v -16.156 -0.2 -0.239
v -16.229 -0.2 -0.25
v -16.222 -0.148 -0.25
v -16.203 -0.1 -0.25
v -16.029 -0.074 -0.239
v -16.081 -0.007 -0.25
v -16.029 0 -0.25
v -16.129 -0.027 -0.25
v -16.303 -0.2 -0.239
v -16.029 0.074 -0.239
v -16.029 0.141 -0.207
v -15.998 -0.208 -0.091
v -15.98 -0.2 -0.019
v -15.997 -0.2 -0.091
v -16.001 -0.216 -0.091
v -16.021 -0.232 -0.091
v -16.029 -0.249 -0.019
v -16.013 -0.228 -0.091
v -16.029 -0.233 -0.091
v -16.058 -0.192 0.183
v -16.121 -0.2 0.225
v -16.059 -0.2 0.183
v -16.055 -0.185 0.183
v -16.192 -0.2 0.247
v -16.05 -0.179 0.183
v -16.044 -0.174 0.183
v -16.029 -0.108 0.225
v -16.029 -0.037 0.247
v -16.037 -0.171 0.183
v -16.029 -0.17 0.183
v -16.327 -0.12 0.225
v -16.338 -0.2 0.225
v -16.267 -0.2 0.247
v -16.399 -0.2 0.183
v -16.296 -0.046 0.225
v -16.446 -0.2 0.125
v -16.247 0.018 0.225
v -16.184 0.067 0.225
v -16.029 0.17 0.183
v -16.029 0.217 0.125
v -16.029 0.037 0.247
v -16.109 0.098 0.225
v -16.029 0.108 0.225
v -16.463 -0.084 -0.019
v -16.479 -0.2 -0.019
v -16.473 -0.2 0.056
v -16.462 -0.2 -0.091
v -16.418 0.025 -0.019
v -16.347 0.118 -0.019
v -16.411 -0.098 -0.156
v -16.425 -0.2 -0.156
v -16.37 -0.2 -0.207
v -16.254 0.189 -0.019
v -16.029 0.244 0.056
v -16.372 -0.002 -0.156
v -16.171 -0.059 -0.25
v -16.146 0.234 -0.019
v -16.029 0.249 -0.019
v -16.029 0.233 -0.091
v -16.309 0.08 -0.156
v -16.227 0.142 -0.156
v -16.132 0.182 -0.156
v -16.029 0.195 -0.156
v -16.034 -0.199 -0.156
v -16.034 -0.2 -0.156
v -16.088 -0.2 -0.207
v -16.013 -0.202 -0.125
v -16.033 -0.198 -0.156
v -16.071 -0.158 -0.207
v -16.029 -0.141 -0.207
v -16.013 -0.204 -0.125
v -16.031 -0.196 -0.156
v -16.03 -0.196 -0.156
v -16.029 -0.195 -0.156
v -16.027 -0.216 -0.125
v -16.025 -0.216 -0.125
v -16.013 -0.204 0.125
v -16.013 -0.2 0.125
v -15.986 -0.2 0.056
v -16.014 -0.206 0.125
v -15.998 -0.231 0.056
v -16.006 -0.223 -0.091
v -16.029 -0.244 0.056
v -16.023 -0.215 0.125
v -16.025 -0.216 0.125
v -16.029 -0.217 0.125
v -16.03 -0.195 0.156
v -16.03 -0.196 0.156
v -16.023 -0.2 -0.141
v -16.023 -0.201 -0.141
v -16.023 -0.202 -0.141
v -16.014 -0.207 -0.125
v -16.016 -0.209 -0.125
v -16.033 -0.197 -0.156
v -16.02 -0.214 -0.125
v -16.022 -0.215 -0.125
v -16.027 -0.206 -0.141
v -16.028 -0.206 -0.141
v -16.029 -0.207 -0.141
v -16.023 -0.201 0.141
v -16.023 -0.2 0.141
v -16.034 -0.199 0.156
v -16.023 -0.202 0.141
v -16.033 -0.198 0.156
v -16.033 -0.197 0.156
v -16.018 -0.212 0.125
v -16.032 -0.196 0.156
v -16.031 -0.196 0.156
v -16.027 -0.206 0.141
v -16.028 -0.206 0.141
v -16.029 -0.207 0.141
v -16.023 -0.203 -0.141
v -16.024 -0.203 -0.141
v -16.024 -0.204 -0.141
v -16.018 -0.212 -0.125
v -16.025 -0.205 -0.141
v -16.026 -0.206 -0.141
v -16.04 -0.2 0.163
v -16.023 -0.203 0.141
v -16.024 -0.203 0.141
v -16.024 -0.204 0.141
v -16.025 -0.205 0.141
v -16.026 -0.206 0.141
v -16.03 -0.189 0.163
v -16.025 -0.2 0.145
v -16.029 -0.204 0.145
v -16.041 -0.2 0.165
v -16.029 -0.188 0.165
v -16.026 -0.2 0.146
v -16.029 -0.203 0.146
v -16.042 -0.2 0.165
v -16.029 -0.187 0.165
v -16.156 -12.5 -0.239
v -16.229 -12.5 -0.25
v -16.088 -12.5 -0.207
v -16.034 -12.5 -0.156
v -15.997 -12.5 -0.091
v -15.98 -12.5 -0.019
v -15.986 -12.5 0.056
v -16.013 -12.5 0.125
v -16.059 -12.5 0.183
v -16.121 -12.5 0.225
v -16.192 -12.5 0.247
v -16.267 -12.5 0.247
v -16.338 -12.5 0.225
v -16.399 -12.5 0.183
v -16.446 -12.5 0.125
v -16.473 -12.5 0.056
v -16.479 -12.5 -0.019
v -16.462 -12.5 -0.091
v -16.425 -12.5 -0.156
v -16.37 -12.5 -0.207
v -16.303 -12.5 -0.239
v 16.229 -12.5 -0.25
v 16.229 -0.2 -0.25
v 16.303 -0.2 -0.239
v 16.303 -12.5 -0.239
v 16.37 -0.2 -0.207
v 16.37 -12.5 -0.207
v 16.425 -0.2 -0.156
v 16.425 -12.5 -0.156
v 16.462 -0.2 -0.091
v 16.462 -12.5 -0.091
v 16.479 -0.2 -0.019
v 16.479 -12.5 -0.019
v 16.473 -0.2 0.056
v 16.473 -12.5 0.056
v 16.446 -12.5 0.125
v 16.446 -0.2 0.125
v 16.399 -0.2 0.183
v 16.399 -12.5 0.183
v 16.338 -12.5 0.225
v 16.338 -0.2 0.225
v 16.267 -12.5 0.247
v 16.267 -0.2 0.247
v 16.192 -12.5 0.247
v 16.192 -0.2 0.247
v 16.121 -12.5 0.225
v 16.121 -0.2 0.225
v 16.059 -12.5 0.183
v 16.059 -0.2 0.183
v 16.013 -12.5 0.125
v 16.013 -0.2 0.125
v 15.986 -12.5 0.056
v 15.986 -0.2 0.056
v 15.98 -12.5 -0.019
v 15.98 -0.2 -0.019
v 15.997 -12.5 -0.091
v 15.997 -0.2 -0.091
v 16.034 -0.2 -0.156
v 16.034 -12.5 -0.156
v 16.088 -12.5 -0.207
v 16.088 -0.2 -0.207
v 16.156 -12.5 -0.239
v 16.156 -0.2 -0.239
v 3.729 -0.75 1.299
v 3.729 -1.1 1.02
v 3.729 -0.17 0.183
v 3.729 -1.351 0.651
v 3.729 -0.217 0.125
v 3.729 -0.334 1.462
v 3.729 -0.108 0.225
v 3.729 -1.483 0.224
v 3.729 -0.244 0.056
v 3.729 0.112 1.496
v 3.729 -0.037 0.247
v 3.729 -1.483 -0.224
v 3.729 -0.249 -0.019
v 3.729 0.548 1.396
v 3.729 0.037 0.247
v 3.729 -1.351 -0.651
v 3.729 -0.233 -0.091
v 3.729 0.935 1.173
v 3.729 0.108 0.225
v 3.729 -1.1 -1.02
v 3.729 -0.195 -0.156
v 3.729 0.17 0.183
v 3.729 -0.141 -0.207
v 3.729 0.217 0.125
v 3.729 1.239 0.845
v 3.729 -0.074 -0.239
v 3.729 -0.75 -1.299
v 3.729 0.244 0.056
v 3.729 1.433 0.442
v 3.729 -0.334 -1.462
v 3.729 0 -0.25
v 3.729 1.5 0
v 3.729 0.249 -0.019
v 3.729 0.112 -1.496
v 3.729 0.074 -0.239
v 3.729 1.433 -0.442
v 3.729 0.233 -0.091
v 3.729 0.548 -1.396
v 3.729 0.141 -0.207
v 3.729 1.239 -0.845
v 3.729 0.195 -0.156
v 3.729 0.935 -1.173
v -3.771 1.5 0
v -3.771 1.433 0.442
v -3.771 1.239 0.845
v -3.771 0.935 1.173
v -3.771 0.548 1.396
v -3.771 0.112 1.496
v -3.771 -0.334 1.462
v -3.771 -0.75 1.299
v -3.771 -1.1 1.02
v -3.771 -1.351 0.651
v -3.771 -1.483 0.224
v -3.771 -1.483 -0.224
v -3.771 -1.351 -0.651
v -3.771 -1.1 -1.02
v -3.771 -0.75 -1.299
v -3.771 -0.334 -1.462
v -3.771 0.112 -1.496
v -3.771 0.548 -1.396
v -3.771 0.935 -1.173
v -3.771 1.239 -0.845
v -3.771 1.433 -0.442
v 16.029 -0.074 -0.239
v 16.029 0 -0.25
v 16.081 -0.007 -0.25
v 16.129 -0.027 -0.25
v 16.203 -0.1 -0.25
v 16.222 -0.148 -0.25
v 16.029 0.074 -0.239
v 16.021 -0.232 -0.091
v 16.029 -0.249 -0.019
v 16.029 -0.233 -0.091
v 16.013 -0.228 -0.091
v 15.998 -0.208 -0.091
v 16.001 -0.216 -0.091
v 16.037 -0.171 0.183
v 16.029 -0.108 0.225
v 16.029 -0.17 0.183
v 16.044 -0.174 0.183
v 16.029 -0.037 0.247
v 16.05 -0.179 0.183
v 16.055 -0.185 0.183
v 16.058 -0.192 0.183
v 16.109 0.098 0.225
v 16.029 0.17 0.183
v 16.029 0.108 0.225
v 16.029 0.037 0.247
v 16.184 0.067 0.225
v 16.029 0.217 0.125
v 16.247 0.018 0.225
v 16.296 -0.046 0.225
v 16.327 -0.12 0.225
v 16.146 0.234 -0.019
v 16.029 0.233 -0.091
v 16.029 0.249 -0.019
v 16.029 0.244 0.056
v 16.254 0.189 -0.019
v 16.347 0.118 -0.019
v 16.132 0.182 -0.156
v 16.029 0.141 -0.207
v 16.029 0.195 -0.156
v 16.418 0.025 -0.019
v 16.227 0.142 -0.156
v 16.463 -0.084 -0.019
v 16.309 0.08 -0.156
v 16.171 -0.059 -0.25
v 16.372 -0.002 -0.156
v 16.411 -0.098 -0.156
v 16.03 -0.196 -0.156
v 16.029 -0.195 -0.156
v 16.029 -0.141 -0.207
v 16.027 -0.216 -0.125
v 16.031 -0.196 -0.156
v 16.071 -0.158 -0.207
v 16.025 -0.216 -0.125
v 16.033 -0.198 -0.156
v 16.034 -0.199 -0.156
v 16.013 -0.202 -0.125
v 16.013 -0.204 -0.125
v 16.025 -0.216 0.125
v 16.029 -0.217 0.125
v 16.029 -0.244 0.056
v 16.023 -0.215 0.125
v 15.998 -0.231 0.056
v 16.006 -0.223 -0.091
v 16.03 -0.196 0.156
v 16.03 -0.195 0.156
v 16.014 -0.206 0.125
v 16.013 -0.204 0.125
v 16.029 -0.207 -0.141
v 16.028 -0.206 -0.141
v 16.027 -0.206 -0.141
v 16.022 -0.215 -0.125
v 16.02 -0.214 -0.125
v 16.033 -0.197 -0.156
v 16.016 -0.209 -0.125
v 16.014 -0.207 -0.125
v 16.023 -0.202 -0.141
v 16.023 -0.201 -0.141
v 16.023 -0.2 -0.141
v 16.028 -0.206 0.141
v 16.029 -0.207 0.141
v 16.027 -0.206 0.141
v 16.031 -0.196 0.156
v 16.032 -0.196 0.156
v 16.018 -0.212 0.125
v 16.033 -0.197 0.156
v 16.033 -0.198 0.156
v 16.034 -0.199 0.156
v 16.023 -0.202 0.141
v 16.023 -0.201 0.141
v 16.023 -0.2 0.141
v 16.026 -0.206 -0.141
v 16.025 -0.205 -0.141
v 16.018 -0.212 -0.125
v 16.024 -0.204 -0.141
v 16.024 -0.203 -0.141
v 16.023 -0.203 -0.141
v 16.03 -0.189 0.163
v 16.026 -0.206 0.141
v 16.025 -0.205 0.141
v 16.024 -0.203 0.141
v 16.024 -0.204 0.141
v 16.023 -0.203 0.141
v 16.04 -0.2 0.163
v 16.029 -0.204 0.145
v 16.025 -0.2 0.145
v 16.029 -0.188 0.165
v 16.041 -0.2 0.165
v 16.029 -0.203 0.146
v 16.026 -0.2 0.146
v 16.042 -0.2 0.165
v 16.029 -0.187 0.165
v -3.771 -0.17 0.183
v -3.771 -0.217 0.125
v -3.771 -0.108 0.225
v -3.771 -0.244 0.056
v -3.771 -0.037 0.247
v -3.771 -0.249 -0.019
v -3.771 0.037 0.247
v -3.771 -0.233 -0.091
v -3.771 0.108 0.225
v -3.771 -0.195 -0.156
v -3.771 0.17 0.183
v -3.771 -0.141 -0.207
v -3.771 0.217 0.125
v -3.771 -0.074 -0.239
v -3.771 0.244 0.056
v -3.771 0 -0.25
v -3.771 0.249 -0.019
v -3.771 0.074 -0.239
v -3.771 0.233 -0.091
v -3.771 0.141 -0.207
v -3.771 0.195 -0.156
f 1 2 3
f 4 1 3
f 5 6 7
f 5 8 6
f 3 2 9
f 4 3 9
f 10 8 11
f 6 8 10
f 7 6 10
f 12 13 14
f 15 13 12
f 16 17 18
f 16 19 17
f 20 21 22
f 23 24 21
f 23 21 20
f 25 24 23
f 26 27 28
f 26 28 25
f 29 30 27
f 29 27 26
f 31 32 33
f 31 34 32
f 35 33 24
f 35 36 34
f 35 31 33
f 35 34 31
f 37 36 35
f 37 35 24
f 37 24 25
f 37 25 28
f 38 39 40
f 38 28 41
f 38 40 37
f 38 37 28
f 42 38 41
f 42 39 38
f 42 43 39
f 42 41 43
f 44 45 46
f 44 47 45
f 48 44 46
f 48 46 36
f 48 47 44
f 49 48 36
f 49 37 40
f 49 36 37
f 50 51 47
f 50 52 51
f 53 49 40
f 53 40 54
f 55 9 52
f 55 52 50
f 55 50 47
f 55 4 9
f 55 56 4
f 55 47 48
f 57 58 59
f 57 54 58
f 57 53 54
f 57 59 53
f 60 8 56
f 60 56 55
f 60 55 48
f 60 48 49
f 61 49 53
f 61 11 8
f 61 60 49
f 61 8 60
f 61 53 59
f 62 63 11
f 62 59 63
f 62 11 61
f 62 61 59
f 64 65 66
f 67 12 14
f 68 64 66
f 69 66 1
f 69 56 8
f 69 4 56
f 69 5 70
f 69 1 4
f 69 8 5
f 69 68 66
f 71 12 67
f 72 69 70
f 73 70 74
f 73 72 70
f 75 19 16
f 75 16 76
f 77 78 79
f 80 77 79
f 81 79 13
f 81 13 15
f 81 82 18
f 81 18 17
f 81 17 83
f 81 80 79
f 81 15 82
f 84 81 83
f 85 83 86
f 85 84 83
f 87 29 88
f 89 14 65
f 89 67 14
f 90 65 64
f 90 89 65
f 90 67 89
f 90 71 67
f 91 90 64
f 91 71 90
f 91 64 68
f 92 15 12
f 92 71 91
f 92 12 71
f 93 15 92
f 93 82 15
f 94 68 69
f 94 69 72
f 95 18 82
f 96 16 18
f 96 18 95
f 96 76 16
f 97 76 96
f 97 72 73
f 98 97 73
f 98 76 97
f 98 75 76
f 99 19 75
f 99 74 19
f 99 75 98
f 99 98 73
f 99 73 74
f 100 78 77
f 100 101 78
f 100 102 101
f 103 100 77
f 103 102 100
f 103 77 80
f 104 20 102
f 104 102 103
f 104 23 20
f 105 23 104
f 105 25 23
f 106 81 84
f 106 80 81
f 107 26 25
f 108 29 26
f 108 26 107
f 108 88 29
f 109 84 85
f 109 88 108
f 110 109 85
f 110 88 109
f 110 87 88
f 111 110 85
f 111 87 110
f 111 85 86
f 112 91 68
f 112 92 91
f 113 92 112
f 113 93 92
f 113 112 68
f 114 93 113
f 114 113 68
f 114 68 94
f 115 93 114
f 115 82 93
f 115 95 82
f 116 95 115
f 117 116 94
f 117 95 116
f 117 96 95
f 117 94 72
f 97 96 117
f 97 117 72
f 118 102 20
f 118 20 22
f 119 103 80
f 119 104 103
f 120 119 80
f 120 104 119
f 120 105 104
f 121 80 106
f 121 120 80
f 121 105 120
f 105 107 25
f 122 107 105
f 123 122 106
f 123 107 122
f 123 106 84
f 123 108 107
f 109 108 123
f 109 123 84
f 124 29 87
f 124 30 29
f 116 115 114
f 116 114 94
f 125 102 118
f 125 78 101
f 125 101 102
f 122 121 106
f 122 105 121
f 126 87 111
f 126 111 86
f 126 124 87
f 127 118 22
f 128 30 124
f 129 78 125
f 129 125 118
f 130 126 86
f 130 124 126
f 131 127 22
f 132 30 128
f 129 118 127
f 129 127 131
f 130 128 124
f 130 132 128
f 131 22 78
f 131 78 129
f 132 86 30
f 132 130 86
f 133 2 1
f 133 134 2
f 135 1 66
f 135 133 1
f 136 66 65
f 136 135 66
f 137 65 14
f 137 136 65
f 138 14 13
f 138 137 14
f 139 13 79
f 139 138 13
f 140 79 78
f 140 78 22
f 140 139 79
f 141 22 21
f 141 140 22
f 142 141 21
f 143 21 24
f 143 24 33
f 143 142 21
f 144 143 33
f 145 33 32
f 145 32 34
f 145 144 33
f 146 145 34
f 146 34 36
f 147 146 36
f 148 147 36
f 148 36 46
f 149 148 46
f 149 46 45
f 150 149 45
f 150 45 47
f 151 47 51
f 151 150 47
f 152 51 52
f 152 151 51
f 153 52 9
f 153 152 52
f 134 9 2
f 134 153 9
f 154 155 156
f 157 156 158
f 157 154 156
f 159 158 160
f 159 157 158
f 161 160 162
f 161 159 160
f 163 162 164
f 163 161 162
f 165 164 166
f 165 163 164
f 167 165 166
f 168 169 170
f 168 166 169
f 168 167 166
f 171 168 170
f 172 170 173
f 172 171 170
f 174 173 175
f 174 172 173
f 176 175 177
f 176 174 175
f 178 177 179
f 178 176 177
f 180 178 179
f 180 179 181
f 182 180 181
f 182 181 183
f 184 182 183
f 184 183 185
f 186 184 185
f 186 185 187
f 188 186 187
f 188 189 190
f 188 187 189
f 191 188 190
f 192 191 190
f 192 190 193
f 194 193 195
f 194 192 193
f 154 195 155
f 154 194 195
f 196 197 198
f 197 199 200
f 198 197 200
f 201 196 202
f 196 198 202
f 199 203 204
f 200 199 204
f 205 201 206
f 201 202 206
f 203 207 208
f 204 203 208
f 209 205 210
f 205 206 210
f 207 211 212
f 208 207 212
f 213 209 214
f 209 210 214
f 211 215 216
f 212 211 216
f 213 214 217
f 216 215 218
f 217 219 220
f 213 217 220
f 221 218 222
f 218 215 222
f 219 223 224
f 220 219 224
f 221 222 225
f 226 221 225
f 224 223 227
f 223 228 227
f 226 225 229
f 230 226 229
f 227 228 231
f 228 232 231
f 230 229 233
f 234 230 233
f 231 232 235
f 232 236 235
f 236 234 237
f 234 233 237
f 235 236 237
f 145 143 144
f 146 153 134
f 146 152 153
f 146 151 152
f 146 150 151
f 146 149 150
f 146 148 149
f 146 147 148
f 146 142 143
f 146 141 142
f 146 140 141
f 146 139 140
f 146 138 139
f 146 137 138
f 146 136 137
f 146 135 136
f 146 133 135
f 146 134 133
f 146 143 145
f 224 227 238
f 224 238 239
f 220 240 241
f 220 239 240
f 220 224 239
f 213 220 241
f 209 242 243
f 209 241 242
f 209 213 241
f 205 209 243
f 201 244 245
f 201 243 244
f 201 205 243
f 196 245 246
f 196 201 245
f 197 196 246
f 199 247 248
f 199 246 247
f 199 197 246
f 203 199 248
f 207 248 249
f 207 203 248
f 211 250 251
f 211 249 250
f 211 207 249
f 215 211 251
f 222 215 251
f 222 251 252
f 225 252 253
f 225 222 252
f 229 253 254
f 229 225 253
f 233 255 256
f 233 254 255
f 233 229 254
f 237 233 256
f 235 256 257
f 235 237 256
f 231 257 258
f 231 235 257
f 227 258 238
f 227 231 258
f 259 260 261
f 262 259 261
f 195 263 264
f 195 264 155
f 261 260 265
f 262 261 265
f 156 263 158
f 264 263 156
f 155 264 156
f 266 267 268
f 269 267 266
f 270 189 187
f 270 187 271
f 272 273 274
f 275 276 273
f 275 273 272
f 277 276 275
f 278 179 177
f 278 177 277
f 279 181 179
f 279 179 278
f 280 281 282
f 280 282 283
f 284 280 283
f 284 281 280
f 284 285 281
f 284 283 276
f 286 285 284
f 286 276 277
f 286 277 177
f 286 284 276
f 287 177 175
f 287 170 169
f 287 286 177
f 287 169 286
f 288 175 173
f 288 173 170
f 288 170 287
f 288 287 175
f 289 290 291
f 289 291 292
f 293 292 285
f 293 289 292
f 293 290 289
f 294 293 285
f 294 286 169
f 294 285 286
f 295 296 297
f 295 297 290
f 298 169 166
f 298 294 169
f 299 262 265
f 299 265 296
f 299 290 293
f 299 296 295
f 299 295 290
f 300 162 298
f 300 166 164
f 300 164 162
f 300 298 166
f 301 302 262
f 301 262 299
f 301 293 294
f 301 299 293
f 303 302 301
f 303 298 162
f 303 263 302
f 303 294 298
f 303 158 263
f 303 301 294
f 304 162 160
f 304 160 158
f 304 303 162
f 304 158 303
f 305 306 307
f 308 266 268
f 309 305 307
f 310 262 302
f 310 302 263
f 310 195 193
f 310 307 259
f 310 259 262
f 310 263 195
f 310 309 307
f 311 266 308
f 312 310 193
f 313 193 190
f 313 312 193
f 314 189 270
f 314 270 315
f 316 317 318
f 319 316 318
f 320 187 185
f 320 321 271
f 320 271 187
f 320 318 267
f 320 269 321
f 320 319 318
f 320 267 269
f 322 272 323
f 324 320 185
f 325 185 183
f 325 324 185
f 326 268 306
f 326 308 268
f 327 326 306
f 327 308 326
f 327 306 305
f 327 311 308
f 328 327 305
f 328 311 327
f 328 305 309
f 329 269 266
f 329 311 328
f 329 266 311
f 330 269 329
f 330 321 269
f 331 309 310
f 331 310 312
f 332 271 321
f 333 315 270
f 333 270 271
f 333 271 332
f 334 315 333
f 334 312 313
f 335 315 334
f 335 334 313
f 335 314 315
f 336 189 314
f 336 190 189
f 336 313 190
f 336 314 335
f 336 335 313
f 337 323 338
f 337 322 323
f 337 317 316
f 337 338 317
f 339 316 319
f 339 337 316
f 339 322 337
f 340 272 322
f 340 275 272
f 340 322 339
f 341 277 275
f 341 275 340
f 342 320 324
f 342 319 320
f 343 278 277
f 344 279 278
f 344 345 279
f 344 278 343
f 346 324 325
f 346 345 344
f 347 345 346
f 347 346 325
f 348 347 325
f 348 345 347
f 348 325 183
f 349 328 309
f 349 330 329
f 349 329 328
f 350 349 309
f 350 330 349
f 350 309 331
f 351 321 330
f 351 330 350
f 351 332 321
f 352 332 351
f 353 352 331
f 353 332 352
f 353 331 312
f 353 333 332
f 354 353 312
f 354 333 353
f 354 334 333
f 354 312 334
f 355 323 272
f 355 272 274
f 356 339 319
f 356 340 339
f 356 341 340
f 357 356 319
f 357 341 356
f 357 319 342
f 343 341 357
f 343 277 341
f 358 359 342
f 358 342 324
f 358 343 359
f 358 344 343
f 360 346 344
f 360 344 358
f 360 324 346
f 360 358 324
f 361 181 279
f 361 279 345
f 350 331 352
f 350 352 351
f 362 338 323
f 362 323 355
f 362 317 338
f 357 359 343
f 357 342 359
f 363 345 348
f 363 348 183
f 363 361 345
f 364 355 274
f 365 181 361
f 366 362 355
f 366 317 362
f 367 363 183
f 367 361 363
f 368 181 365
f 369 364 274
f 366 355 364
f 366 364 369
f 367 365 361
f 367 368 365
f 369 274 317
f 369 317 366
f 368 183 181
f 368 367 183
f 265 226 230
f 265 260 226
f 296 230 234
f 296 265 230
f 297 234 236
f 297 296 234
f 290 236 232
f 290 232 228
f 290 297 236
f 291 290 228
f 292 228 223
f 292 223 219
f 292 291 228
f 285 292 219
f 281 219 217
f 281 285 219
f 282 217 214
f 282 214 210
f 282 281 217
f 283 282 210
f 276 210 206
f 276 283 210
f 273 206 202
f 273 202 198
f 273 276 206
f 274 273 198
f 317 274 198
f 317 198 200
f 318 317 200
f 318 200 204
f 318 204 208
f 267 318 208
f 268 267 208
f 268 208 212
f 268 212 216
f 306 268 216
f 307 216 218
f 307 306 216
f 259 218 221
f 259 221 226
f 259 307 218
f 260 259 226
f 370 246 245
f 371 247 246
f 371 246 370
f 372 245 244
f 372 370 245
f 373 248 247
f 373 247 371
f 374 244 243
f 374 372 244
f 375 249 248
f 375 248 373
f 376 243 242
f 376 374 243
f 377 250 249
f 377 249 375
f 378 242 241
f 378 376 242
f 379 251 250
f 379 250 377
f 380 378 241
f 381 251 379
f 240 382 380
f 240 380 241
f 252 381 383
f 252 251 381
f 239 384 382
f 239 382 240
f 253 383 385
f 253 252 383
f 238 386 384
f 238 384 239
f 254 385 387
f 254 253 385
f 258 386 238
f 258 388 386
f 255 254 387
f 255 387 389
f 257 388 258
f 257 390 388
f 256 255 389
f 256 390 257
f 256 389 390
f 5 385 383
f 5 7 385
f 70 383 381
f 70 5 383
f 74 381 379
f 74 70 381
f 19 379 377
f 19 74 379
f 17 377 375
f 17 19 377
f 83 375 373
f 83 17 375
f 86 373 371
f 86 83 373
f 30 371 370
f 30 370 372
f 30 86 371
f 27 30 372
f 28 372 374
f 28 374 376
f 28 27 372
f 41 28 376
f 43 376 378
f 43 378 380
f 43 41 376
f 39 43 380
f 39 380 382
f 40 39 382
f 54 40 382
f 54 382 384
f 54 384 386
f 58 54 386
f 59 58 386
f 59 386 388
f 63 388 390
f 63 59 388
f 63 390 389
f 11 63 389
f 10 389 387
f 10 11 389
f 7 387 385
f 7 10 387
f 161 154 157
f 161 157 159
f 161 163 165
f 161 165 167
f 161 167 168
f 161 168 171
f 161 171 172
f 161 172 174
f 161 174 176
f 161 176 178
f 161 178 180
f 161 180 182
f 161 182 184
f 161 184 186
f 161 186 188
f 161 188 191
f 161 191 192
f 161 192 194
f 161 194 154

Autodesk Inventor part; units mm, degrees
ref_plane "YZ Plane" through (0, 0, 0) normal (1, 0, 0) x (0, 1, 0)
ref_plane "XZ Plane" through (0, 0, 0) normal (0, 1, 0) x (-1, 0, 0)
ref_plane "XY Plane" through (0, 0, 0) normal (0, 0, 1) x (1, 0, 0)
sketch "Эскиз1" plane through (0, 0, 0) normal (0, 0, 1) x (1, 0, 0)
  line L0 (-3.7707, 0) -> (-3.7707, 1.5)
  line L1 (-3.7707, 1.5) -> (3.7293, 1.5)
  line L2 (3.7293, 1.5) -> (3.7293, 0)
  line L3 (3.7293, 0) -> (-3.7707, 0)
  point P0 (0, 0)
  dimension "d0" = 1.5
  dimension "d1" = 7.5
revolve "Вращение1" add sketch "Эскиз1" angle 360 about axis through (3.7293, 0, 0) along (-1, 0, 0)
sketch "Эскиз4" plane through (0, 0, 0) normal (0, 0, 1) x (1, 0, 0)
  line L0 (3.7293, 1.5) -> (3.7293, -1.5) projected
  line L1 (3.7293, 0) -> (16.0293, 0)
  line L2 (16.2293, -0.2) -> (16.2293, -12.5)
  arc A0 (16.2293, -0.2) -> (16.0293, 0) centre (16.0293, -0.2) ccw
  point P0 (0, 0)
  point P1 (16.2293, 0)
  dimension "d3" = 12.5
  dimension "d4" = 12.5
  dimension "d5" = 0.2
ref_plane "РабПлоскость1" through (3.7293, 0, 0) normal (1, 0, 0) x (0, 0, -1)
sketch "Эскиз5" plane through (3.7293, 0, 0) normal (1, 0, 0) x (0, 0, -1)
  circle A0 centre (0, 0) radius 0.25
  dimension "d7" = 0.5
sweep "Сдвиг1" add profiles "Эскиз5" path "Эскиз4" path curves L1 A0 L2
mirror "Зеркальное отражение1" about plane through (0, 0, 0) normal (1, 0, 0) of "Сдвиг1"
properties part number "КС147А"
